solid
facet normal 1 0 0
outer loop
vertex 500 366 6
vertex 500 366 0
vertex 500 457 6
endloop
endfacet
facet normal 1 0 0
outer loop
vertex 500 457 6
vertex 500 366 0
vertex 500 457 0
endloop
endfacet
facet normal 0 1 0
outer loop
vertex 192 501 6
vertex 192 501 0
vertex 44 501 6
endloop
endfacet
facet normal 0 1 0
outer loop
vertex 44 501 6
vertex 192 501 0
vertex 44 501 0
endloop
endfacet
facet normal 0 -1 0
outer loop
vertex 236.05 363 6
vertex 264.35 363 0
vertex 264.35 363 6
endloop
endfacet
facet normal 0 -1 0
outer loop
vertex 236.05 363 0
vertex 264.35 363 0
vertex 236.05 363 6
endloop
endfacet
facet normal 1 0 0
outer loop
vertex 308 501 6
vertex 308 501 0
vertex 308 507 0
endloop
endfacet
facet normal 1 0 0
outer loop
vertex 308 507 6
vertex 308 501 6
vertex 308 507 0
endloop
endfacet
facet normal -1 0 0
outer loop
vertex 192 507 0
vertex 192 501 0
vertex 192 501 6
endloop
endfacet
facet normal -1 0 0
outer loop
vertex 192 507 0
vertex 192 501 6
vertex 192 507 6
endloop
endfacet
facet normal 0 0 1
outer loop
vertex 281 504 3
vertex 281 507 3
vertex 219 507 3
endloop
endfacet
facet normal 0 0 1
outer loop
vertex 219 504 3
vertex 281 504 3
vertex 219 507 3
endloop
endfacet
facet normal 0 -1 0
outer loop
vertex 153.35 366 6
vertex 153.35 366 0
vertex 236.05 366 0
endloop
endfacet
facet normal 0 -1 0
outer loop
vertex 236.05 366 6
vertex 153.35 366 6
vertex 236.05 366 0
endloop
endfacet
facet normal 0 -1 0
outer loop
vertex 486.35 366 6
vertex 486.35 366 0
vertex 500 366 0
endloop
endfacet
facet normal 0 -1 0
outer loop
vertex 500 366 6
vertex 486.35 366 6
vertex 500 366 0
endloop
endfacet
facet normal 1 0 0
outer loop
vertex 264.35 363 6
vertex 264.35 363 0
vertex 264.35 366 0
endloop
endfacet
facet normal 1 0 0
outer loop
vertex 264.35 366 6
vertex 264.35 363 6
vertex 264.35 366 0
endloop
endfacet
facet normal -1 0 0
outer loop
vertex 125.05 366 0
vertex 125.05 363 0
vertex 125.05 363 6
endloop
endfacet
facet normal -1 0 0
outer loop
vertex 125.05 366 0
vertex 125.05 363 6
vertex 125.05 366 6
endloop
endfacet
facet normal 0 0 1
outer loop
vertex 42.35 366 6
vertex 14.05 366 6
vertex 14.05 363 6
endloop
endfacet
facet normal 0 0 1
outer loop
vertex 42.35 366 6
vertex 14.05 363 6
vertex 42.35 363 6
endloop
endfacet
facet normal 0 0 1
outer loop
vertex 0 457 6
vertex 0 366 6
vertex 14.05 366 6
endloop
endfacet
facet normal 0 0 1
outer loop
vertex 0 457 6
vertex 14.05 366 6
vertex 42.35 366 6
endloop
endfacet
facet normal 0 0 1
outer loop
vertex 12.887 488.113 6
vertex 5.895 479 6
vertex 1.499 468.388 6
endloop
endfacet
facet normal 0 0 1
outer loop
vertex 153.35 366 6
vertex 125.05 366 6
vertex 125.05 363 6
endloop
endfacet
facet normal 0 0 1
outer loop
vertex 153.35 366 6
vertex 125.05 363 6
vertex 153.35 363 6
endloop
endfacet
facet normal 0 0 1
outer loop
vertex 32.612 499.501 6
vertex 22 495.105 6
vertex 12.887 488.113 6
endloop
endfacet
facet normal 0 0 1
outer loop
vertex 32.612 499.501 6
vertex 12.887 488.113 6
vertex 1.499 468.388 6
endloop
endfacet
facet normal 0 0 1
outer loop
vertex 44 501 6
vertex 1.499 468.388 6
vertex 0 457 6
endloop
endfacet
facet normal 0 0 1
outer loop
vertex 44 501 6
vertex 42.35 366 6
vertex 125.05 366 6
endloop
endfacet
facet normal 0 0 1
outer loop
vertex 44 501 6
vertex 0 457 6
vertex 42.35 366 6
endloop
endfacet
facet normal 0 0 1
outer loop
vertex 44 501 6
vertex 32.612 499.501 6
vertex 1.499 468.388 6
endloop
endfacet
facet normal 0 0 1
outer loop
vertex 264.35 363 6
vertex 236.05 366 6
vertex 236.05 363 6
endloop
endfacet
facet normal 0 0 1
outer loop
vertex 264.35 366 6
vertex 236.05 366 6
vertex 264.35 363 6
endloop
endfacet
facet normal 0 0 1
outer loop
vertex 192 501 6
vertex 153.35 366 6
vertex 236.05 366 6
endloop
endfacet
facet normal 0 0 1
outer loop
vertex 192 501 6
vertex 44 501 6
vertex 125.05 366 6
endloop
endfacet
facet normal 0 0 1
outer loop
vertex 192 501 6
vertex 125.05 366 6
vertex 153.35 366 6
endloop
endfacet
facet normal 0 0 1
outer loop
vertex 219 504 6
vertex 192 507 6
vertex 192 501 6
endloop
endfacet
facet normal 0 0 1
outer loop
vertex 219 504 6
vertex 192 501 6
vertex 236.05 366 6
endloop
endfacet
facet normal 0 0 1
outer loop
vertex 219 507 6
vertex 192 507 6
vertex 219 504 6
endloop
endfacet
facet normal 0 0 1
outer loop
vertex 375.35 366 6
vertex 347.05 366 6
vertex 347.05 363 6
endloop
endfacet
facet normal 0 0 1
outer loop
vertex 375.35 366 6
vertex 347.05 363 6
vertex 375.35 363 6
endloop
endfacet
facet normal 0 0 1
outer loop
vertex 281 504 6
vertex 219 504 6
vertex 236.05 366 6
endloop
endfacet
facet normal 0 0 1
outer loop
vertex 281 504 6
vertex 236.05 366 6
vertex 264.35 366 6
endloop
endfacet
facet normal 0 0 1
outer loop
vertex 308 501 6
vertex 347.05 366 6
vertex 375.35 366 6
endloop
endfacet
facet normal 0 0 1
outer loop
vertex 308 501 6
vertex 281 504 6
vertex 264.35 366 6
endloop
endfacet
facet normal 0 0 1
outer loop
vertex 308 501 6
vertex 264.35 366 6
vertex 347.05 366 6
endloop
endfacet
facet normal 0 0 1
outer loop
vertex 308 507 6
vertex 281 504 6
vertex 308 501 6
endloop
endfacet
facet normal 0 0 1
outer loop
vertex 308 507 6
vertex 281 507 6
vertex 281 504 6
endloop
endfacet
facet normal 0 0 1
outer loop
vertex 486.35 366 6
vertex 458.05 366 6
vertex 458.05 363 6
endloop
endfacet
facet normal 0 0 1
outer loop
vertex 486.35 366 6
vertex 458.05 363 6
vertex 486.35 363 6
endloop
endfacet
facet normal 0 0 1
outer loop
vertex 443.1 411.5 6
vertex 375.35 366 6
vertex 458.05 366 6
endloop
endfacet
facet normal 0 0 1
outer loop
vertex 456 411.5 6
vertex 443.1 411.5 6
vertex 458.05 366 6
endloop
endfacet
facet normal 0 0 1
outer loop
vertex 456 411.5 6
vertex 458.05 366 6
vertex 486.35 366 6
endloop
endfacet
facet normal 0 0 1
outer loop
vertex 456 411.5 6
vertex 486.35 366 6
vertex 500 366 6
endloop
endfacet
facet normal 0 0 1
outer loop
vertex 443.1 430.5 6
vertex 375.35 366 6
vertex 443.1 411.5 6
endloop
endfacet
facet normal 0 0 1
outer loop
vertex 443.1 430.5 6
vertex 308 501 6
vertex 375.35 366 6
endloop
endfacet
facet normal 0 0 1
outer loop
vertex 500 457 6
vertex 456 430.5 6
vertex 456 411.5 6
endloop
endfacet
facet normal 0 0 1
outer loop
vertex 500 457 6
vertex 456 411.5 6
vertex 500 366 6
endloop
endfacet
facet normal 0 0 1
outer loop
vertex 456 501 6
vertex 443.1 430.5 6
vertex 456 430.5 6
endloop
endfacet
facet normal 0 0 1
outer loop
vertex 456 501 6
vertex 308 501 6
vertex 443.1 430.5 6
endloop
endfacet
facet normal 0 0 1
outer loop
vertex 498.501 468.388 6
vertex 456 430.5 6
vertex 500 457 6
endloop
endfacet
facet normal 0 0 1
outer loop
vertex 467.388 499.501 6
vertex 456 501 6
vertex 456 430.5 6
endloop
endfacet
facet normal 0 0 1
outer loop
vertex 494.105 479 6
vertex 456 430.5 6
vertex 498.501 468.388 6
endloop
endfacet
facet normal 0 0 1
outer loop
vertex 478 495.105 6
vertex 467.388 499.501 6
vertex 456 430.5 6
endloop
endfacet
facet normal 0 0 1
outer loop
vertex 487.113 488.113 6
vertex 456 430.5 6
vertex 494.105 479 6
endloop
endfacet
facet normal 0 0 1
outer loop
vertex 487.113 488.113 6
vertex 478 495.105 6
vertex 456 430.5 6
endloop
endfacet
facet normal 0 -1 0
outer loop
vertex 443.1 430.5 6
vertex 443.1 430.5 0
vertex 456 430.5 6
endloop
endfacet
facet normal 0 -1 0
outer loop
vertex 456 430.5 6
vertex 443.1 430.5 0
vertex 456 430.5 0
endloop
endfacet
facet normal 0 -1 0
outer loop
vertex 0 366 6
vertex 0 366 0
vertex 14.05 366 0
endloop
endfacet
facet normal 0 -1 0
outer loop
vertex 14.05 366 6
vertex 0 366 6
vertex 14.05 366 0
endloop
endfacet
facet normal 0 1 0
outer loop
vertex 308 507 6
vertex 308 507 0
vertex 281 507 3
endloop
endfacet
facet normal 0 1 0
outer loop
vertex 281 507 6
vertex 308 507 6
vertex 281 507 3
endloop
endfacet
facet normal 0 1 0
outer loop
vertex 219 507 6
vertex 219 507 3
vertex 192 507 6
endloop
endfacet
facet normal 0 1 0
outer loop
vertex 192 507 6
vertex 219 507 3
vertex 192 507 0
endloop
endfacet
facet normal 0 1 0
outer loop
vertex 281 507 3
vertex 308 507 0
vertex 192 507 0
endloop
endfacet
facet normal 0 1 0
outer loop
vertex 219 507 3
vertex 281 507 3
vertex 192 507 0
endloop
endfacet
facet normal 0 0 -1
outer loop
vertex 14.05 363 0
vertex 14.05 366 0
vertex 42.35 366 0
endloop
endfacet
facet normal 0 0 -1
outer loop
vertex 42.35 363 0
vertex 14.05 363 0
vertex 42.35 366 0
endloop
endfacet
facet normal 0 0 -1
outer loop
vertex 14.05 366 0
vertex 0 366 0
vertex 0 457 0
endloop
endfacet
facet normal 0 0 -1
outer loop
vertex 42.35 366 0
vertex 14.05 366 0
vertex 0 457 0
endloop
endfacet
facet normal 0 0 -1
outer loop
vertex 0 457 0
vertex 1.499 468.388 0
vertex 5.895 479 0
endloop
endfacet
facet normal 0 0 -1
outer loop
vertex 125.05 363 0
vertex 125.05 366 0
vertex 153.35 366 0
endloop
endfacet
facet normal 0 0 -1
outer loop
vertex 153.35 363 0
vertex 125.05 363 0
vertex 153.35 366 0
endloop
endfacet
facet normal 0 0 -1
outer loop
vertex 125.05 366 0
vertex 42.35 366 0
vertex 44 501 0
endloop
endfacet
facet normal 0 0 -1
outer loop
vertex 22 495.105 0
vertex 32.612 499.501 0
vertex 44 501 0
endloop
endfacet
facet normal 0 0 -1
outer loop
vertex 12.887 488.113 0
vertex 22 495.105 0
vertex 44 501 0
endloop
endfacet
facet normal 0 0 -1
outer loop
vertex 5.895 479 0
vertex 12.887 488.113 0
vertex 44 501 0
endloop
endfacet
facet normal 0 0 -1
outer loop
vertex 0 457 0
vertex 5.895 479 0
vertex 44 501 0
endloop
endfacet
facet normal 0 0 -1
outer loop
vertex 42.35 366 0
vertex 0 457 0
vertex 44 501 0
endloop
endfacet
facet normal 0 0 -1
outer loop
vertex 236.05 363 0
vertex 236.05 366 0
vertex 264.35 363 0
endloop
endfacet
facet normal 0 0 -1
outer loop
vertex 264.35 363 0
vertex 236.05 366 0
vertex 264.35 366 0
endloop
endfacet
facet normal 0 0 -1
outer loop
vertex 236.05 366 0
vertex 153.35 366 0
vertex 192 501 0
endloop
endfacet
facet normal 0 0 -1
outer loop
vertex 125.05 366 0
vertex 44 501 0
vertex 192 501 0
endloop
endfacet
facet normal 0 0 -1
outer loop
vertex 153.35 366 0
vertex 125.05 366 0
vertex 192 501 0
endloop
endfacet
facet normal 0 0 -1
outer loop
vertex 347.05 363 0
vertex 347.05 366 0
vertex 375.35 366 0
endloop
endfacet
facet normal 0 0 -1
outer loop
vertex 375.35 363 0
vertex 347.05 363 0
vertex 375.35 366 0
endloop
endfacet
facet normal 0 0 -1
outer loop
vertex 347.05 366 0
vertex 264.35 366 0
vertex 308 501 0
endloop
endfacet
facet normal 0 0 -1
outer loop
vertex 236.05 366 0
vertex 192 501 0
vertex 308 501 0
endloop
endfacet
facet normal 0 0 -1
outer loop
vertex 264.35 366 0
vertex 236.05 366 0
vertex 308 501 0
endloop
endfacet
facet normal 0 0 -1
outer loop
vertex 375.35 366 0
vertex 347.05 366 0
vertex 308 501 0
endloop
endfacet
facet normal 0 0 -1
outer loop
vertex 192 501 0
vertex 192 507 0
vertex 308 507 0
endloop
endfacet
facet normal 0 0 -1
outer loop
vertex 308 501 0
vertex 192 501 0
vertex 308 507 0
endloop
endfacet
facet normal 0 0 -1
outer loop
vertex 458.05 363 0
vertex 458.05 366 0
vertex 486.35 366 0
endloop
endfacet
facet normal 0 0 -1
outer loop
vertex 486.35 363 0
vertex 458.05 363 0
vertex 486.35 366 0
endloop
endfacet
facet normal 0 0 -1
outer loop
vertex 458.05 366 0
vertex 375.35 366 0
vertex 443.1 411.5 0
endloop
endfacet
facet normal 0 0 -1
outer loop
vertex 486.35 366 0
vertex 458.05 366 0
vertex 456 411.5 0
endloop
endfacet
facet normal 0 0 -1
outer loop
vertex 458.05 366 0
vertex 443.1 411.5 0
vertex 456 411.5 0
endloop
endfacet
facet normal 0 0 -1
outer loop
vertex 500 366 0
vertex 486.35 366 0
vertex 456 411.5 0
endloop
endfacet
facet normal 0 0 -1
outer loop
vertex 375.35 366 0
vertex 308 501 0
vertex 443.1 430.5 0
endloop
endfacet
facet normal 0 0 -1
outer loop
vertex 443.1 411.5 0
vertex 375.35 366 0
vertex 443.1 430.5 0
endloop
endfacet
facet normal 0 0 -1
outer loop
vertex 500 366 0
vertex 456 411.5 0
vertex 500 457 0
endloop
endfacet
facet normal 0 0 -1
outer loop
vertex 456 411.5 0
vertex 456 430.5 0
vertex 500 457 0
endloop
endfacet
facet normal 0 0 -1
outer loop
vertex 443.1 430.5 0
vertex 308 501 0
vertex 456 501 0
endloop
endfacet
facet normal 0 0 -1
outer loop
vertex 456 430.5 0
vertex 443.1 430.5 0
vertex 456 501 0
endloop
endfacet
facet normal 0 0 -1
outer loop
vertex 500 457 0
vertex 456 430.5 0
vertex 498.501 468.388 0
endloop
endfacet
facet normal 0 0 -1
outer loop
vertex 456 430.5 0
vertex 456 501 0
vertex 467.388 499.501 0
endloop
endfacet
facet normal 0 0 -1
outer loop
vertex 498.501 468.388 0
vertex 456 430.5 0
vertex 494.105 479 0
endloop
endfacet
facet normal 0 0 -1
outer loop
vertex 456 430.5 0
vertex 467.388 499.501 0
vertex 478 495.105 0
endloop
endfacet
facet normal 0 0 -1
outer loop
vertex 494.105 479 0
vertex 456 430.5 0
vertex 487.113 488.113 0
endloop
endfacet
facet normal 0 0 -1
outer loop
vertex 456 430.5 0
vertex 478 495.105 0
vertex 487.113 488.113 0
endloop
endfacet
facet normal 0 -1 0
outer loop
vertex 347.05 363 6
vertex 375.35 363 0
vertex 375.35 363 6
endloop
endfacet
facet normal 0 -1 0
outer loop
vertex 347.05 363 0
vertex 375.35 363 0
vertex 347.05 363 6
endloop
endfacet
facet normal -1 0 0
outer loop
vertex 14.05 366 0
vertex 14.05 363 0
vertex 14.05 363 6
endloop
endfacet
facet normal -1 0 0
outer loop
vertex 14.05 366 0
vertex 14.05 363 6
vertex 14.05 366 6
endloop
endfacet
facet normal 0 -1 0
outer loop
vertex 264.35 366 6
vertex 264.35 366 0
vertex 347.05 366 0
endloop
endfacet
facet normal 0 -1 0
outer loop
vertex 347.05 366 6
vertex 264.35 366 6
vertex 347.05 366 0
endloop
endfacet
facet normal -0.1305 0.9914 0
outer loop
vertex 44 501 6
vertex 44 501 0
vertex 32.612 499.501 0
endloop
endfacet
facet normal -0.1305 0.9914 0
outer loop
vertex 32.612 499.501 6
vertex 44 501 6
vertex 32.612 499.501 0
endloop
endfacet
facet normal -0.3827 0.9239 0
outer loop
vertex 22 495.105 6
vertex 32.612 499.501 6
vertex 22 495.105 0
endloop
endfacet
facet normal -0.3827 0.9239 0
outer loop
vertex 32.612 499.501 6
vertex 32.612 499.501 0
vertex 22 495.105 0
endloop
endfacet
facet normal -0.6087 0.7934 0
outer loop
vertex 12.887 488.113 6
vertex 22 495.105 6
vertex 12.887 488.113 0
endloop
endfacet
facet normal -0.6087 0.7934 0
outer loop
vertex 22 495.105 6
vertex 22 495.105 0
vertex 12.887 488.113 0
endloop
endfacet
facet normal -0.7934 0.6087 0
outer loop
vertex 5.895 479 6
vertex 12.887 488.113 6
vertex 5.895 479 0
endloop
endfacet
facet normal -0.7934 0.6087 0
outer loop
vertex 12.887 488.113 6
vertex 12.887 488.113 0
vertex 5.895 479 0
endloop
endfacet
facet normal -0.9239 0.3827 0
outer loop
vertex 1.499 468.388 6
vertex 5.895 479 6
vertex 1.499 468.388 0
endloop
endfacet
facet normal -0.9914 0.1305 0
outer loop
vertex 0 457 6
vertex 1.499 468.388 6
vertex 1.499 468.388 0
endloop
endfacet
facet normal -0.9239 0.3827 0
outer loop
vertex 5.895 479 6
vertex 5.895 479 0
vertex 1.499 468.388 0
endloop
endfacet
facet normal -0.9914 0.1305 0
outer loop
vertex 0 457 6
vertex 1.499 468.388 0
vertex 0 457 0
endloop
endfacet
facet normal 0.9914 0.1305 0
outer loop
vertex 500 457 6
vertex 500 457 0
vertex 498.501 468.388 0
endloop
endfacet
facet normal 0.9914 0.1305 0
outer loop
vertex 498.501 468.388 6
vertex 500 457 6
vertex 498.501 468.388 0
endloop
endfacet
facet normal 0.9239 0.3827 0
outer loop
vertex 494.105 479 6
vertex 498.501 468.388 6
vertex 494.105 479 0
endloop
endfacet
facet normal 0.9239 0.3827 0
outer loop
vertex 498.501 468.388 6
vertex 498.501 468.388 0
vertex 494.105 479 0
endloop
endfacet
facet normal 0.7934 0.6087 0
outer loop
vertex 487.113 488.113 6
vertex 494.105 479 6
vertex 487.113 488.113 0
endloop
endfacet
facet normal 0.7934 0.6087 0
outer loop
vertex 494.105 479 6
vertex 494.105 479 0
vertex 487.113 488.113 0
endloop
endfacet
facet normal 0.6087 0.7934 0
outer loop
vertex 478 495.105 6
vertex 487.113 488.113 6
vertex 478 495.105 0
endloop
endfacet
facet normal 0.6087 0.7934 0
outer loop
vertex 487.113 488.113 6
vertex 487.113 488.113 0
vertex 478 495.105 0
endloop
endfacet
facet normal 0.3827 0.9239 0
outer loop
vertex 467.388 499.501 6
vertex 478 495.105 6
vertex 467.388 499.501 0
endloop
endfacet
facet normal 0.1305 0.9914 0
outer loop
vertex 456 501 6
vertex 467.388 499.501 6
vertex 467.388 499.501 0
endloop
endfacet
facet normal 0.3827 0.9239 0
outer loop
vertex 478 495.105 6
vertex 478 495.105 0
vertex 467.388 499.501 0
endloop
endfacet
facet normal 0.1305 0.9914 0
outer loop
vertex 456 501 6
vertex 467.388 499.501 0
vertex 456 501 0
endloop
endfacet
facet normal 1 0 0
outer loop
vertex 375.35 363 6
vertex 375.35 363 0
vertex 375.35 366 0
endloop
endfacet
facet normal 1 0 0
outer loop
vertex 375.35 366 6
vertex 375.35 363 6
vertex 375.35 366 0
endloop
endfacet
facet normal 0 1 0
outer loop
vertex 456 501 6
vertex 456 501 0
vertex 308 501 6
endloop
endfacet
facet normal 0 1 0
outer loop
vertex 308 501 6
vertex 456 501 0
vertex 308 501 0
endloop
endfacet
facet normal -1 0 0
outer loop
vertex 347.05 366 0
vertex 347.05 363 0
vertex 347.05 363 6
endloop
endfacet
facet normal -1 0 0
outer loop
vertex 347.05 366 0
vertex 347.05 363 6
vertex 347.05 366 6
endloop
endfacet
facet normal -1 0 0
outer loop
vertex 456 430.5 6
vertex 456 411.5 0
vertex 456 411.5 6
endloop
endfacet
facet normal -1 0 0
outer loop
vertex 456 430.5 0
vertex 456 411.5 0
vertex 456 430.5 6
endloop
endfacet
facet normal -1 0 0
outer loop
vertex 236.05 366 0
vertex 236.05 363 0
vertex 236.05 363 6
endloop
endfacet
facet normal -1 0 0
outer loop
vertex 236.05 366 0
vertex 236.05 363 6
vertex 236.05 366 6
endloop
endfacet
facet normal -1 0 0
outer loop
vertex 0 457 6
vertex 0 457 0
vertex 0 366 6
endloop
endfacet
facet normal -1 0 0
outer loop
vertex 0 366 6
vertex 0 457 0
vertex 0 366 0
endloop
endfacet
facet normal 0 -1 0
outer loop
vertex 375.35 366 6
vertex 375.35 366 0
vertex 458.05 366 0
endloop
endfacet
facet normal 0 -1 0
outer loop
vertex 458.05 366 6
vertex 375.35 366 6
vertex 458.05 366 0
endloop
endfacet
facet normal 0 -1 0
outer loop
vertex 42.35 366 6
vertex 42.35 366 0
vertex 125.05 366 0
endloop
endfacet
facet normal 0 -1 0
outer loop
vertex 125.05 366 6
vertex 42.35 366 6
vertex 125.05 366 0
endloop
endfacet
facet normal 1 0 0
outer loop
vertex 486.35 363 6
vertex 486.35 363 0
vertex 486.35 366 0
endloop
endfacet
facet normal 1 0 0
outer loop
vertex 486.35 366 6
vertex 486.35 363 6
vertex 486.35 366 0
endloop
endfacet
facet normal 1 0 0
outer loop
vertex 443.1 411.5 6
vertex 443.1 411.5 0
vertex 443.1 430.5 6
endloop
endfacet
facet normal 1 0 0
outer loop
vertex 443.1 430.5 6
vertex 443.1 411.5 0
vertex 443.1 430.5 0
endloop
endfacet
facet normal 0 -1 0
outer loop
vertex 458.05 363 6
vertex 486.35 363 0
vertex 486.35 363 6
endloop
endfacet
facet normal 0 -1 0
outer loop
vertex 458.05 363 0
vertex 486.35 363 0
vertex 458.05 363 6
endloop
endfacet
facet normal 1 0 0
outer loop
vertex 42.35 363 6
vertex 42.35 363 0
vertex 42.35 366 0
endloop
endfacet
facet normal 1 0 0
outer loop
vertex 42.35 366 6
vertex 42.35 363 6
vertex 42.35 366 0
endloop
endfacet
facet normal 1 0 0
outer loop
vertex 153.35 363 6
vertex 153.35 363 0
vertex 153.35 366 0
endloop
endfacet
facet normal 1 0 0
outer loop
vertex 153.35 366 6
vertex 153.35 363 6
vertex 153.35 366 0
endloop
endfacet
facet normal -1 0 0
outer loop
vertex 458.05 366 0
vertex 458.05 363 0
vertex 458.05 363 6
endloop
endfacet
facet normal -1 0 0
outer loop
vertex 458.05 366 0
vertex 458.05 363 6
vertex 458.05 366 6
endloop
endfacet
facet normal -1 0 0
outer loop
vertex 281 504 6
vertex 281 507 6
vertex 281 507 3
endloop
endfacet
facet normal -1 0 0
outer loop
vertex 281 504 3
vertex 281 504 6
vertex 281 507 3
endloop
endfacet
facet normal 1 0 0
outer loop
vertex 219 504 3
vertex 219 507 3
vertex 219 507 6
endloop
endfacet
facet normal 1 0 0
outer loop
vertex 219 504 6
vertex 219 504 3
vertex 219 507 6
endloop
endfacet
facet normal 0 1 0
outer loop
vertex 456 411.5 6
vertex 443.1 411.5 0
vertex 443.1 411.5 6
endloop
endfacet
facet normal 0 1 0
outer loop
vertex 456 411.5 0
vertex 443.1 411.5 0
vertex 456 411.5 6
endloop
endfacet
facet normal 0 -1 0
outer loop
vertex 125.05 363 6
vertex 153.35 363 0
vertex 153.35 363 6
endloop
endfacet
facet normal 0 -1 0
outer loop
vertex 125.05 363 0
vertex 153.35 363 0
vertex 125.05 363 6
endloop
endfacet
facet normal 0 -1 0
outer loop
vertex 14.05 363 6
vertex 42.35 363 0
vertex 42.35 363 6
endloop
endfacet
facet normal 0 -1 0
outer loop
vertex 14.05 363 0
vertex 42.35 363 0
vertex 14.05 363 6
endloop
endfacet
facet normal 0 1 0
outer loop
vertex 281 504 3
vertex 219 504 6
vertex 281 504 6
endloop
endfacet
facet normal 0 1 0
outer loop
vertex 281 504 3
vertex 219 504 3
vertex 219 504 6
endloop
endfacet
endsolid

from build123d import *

# Parameters (mm, degrees)
STOCK_BACK_1_OUTLINE_W = 12.9
STOCK_BACK_1_OUTLINE_H = 19
STOCK_BACK_1_DEPTH     = 6
SKETCH2_W              = 28.3
SKETCH2_H              = 3
BOSS_EXTRUDE2_DEPTH    = 6
LPATTERN2_COUNT        = 5
LPATTERN2_PITCH        = 111
SKETCH3_W              = 116
SKETCH3_H              = 6
BOSS_EXTRUDE4_DEPTH    = 6
CUT_EXTRUDE1_DEPTH     = 3


# Read off the part's stored shape, not the designer's step: Stock-Back-1
with BuildPart() as part:
    # Stock-Back-1 outline → Stock-Back-1 (new body)
    with BuildSketch(Plane.XY):
        with BuildLine():
            Line((0, 457), (0, 366))
            Line((0, 366), (500, 366))
            Line((500, 366), (500, 457))
            ThreePointArc((500, 457), (487.112698372, 488.112698372), (456, 501))
            Line((456, 501), (44, 501))
            ThreePointArc((44, 501), (12.887301628, 488.112698372), (0, 457))
        make_face()
        with Locations((449.55, 421)):
            Rectangle(STOCK_BACK_1_OUTLINE_W, STOCK_BACK_1_OUTLINE_H, mode=Mode.SUBTRACT)
    extrude(amount=STOCK_BACK_1_DEPTH)

    # Sketch2 → Boss-Extrude2 (add)
    with BuildSketch(Plane(origin=(0, 0, 0), x_dir=(-1, 0, 0), z_dir=(0, 0, -1))):
        with Locations((-472.2, 364.5)):
            Rectangle(SKETCH2_W, SKETCH2_H)
    boss_extrude2 = extrude(amount=-BOSS_EXTRUDE2_DEPTH)

    # LPattern2: Boss-Extrude2 ×5
    with Locations(*[(-i * LPATTERN2_PITCH, 0, 0) for i in range(1, LPATTERN2_COUNT)]):
        add(boss_extrude2)

    # Sketch3 → Boss-Extrude4 (add)
    with BuildSketch(Plane(origin=(0, 0, 0), x_dir=(-1, 0, 0), z_dir=(0, 0, -1))):
        with Locations((-250, 504)):
            Rectangle(SKETCH3_W, SKETCH3_H)
    extrude(amount=-BOSS_EXTRUDE4_DEPTH)

    # Sketch4 → Cut-Extrude1 (cut)
    with BuildSketch(Plane(origin=(0, 507, 0), x_dir=(1, 0, 0), z_dir=(0, 1, 0))):
        with BuildLine():
            Line((219, -6), (281, -6))
            Line((281, -6), (281, -5))
            ThreePointArc((281, -5), (280.414213562, -3.585786438), (279, -3))
            Line((279, -3), (221, -3))
            ThreePointArc((221, -3), (219.585786438, -3.585786438), (219, -5))
            Line((219, -5), (219, -6))
        make_face()
        with BuildLine():
            Line((219, -3), (219, -5))
            ThreePointArc((219, -5), (219.585786438, -3.585786438), (221, -3))
            Line((221, -3), (219, -3))
        make_face()
        with BuildLine():
            ThreePointArc((279, -3), (280.414213562, -3.585786438), (281, -5))
            Line((281, -5), (281, -3))
            Line((281, -3), (279, -3))
        make_face()
    extrude(amount=-CUT_EXTRUDE1_DEPTH, mode=Mode.SUBTRACT)


solid = part.part
